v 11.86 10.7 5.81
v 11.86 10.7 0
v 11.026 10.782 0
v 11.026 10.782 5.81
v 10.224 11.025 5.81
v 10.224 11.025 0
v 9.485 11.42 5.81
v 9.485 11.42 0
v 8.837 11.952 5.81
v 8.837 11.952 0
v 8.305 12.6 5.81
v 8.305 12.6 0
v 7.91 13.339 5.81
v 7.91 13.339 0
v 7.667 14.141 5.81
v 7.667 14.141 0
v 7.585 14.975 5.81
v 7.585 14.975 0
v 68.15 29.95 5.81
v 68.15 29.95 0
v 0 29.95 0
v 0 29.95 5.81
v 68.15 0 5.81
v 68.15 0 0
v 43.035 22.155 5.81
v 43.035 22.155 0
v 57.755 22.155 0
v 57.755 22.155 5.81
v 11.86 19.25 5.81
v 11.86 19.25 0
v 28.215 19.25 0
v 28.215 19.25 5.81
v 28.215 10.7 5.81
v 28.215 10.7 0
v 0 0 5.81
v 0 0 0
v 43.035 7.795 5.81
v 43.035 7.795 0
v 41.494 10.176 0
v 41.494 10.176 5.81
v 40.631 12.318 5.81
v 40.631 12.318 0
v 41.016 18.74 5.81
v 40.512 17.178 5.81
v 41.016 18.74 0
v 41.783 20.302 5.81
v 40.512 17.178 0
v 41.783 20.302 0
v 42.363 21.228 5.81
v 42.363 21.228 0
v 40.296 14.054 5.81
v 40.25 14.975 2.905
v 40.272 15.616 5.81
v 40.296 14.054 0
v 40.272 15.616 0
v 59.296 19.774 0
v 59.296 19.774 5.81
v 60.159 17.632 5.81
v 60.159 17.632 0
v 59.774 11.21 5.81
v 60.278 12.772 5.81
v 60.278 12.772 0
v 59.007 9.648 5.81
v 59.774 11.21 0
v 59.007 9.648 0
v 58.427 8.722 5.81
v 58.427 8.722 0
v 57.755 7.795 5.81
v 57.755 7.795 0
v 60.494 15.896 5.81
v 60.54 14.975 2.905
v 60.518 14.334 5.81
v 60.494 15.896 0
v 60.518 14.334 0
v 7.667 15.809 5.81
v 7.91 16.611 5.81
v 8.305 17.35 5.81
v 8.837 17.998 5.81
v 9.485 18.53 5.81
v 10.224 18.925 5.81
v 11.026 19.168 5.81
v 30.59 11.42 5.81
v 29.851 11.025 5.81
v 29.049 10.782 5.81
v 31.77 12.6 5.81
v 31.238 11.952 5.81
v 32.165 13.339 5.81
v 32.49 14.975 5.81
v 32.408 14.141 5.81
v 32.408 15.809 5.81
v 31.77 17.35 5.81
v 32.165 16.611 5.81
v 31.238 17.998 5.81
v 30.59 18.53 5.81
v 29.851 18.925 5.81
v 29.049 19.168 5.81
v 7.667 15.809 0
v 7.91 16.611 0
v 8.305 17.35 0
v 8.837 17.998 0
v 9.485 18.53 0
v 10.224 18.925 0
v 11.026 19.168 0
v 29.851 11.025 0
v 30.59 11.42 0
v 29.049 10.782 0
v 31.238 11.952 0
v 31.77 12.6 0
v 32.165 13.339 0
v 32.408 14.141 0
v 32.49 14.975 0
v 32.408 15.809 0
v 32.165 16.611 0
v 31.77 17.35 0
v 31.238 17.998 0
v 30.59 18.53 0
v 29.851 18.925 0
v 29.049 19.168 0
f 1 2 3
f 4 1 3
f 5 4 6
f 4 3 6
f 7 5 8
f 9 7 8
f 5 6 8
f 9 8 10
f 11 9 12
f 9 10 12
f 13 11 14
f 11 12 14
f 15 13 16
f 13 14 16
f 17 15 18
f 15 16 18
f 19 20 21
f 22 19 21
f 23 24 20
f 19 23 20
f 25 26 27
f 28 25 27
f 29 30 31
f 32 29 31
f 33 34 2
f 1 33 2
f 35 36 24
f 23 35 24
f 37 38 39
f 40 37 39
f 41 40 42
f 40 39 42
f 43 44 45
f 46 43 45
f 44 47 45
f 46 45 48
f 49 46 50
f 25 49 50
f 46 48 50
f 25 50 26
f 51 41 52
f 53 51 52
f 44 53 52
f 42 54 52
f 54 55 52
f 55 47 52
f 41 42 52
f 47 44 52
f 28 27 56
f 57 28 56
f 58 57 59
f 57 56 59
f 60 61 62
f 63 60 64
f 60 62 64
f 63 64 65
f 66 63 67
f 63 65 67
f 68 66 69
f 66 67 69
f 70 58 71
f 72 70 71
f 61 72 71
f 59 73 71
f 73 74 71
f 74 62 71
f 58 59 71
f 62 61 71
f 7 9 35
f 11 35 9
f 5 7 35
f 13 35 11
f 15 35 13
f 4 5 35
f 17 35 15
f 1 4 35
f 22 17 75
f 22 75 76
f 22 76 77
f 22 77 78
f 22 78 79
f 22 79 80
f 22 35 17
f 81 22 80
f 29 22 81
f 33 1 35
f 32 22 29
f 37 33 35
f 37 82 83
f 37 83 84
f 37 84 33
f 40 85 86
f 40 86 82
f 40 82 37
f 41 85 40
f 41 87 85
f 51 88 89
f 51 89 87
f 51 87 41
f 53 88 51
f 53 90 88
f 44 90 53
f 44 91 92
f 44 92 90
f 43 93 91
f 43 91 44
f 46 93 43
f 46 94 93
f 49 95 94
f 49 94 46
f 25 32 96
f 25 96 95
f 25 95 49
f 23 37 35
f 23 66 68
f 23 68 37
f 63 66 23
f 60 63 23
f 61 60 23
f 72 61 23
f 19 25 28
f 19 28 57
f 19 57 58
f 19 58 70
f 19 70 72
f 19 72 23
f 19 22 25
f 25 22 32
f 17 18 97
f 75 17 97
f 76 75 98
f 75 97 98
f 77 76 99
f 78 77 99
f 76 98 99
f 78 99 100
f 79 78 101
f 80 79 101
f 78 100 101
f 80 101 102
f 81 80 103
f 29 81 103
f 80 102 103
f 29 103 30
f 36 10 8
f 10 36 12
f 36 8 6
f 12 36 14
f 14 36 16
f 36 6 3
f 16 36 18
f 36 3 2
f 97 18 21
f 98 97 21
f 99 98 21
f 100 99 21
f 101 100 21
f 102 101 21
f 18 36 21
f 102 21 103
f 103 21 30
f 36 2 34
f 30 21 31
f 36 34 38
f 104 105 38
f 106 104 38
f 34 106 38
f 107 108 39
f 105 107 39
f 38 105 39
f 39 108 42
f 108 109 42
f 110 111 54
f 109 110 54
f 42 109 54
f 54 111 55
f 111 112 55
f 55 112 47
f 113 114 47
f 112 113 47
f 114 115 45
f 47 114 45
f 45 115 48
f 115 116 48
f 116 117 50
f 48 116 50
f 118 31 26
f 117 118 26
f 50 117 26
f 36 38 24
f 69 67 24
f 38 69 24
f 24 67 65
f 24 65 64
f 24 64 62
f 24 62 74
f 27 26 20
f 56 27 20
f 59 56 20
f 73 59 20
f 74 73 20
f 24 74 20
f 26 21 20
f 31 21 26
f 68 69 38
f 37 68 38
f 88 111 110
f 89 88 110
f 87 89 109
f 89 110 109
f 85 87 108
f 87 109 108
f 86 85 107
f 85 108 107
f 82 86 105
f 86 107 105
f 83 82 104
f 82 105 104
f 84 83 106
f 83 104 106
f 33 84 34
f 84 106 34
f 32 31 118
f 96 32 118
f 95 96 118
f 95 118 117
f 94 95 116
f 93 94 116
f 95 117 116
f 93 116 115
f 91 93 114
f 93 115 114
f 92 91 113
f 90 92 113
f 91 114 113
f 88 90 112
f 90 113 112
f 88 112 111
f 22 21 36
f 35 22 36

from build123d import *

# Parameters (mm, degrees)
BOSS_EXTRUDE1_DEPTH = 5.81


with BuildPart() as part:
    # Sketch2 → Boss-Extrude1 (new body)
    with BuildSketch(Plane.XY):
        Polygon((0, 29.95), (0, 14.975), (0, 0), (68.15, 0), (68.15, 14.975), (68.15, 29.95), align=None)
        with BuildLine():
            ThreePointArc((11.86, 10.7), (8.83711851, 11.95211851), (7.585, 14.975))
            ThreePointArc((7.585, 14.975), (8.83711851, 17.99788149), (11.86, 19.25))
            Line((11.86, 19.25), (20.035, 19.25))
            Line((20.035, 19.25), (28.215, 19.25))
            ThreePointArc((28.215, 19.25), (31.23788149, 17.99788149), (32.49, 14.975))
            ThreePointArc((32.49, 14.975), (31.23788149, 11.95211851), (28.215, 10.7))
            Line((28.215, 10.7), (20.035, 10.7))
            Line((20.035, 10.7), (11.86, 10.7))
        make_face(mode=Mode.SUBTRACT)
        with BuildLine():
            add(Edge.make_bspline(
                [(57.755, 22.155), (60.54, 18.565), (60.54, 14.975)],
                knots=[0, 0, 0, 0.5, 0.5, 0.5], degree=2))
            add(Edge.make_bspline(
                [(60.54, 14.975), (60.54, 11.385), (57.755, 7.795)],
                knots=[0.5, 0.5, 0.5, 1, 1, 1], degree=2))
            Line((57.755, 7.795), (50.395, 7.795))
            Line((50.395, 7.795), (43.035, 7.795))
            add(Edge.make_bspline(
                [(43.035, 7.795), (40.25, 11.385), (40.25, 14.975)],
                knots=[0, 0, 0, 0.5, 0.5, 0.5], degree=2))
            add(Edge.make_bspline(
                [(40.25, 14.975), (40.25, 18.565), (43.035, 22.155)],
                knots=[0.5, 0.5, 0.5, 1, 1, 1], degree=2))
            Line((43.035, 22.155), (50.395, 22.155))
            Line((50.395, 22.155), (57.755, 22.155))
        make_face(mode=Mode.SUBTRACT)
    extrude(amount=BOSS_EXTRUDE1_DEPTH)


solid = part.part
